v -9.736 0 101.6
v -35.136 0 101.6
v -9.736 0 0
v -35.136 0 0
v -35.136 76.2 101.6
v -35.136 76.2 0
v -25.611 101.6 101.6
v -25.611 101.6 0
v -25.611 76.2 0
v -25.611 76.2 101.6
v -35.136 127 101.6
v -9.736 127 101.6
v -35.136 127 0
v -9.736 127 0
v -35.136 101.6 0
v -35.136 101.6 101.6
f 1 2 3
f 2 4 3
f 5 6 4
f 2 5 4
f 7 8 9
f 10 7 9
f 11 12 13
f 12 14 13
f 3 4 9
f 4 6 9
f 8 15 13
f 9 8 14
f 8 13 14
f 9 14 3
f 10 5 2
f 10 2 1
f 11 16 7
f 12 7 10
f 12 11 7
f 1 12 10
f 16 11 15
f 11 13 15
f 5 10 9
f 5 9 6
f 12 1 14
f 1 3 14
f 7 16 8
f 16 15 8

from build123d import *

# Parameters (mm, degrees)
F1_DEPTH = 25.4
F3_DEPTH = 76.2


with BuildPart() as f1:
    # F0 (on Top) → F1 (new body)
    with BuildSketch(Plane.XY):
        Polygon((-35.135657, 0), (-9.735657, 0), (-9.735657, 127), (-35.135657, 127), (-35.135657, 101.6), (-25.610657, 101.6), (-25.610657, 76.2), (-35.135657, 76.2), align=None)
    extrude(amount=F1_DEPTH)

    # F2 (on face) → F3 (join)
    with BuildSketch(Plane.XY.offset(25.4)):
        Polygon((-35.135657, 76.2), (-35.135657, 0), (-9.735657, 0), (-9.735657, 127), (-35.135657, 127), (-35.135657, 101.6), (-25.610657, 101.6), (-25.610657, 76.2), align=None)
    extrude(amount=F3_DEPTH)


solid = f1.part
